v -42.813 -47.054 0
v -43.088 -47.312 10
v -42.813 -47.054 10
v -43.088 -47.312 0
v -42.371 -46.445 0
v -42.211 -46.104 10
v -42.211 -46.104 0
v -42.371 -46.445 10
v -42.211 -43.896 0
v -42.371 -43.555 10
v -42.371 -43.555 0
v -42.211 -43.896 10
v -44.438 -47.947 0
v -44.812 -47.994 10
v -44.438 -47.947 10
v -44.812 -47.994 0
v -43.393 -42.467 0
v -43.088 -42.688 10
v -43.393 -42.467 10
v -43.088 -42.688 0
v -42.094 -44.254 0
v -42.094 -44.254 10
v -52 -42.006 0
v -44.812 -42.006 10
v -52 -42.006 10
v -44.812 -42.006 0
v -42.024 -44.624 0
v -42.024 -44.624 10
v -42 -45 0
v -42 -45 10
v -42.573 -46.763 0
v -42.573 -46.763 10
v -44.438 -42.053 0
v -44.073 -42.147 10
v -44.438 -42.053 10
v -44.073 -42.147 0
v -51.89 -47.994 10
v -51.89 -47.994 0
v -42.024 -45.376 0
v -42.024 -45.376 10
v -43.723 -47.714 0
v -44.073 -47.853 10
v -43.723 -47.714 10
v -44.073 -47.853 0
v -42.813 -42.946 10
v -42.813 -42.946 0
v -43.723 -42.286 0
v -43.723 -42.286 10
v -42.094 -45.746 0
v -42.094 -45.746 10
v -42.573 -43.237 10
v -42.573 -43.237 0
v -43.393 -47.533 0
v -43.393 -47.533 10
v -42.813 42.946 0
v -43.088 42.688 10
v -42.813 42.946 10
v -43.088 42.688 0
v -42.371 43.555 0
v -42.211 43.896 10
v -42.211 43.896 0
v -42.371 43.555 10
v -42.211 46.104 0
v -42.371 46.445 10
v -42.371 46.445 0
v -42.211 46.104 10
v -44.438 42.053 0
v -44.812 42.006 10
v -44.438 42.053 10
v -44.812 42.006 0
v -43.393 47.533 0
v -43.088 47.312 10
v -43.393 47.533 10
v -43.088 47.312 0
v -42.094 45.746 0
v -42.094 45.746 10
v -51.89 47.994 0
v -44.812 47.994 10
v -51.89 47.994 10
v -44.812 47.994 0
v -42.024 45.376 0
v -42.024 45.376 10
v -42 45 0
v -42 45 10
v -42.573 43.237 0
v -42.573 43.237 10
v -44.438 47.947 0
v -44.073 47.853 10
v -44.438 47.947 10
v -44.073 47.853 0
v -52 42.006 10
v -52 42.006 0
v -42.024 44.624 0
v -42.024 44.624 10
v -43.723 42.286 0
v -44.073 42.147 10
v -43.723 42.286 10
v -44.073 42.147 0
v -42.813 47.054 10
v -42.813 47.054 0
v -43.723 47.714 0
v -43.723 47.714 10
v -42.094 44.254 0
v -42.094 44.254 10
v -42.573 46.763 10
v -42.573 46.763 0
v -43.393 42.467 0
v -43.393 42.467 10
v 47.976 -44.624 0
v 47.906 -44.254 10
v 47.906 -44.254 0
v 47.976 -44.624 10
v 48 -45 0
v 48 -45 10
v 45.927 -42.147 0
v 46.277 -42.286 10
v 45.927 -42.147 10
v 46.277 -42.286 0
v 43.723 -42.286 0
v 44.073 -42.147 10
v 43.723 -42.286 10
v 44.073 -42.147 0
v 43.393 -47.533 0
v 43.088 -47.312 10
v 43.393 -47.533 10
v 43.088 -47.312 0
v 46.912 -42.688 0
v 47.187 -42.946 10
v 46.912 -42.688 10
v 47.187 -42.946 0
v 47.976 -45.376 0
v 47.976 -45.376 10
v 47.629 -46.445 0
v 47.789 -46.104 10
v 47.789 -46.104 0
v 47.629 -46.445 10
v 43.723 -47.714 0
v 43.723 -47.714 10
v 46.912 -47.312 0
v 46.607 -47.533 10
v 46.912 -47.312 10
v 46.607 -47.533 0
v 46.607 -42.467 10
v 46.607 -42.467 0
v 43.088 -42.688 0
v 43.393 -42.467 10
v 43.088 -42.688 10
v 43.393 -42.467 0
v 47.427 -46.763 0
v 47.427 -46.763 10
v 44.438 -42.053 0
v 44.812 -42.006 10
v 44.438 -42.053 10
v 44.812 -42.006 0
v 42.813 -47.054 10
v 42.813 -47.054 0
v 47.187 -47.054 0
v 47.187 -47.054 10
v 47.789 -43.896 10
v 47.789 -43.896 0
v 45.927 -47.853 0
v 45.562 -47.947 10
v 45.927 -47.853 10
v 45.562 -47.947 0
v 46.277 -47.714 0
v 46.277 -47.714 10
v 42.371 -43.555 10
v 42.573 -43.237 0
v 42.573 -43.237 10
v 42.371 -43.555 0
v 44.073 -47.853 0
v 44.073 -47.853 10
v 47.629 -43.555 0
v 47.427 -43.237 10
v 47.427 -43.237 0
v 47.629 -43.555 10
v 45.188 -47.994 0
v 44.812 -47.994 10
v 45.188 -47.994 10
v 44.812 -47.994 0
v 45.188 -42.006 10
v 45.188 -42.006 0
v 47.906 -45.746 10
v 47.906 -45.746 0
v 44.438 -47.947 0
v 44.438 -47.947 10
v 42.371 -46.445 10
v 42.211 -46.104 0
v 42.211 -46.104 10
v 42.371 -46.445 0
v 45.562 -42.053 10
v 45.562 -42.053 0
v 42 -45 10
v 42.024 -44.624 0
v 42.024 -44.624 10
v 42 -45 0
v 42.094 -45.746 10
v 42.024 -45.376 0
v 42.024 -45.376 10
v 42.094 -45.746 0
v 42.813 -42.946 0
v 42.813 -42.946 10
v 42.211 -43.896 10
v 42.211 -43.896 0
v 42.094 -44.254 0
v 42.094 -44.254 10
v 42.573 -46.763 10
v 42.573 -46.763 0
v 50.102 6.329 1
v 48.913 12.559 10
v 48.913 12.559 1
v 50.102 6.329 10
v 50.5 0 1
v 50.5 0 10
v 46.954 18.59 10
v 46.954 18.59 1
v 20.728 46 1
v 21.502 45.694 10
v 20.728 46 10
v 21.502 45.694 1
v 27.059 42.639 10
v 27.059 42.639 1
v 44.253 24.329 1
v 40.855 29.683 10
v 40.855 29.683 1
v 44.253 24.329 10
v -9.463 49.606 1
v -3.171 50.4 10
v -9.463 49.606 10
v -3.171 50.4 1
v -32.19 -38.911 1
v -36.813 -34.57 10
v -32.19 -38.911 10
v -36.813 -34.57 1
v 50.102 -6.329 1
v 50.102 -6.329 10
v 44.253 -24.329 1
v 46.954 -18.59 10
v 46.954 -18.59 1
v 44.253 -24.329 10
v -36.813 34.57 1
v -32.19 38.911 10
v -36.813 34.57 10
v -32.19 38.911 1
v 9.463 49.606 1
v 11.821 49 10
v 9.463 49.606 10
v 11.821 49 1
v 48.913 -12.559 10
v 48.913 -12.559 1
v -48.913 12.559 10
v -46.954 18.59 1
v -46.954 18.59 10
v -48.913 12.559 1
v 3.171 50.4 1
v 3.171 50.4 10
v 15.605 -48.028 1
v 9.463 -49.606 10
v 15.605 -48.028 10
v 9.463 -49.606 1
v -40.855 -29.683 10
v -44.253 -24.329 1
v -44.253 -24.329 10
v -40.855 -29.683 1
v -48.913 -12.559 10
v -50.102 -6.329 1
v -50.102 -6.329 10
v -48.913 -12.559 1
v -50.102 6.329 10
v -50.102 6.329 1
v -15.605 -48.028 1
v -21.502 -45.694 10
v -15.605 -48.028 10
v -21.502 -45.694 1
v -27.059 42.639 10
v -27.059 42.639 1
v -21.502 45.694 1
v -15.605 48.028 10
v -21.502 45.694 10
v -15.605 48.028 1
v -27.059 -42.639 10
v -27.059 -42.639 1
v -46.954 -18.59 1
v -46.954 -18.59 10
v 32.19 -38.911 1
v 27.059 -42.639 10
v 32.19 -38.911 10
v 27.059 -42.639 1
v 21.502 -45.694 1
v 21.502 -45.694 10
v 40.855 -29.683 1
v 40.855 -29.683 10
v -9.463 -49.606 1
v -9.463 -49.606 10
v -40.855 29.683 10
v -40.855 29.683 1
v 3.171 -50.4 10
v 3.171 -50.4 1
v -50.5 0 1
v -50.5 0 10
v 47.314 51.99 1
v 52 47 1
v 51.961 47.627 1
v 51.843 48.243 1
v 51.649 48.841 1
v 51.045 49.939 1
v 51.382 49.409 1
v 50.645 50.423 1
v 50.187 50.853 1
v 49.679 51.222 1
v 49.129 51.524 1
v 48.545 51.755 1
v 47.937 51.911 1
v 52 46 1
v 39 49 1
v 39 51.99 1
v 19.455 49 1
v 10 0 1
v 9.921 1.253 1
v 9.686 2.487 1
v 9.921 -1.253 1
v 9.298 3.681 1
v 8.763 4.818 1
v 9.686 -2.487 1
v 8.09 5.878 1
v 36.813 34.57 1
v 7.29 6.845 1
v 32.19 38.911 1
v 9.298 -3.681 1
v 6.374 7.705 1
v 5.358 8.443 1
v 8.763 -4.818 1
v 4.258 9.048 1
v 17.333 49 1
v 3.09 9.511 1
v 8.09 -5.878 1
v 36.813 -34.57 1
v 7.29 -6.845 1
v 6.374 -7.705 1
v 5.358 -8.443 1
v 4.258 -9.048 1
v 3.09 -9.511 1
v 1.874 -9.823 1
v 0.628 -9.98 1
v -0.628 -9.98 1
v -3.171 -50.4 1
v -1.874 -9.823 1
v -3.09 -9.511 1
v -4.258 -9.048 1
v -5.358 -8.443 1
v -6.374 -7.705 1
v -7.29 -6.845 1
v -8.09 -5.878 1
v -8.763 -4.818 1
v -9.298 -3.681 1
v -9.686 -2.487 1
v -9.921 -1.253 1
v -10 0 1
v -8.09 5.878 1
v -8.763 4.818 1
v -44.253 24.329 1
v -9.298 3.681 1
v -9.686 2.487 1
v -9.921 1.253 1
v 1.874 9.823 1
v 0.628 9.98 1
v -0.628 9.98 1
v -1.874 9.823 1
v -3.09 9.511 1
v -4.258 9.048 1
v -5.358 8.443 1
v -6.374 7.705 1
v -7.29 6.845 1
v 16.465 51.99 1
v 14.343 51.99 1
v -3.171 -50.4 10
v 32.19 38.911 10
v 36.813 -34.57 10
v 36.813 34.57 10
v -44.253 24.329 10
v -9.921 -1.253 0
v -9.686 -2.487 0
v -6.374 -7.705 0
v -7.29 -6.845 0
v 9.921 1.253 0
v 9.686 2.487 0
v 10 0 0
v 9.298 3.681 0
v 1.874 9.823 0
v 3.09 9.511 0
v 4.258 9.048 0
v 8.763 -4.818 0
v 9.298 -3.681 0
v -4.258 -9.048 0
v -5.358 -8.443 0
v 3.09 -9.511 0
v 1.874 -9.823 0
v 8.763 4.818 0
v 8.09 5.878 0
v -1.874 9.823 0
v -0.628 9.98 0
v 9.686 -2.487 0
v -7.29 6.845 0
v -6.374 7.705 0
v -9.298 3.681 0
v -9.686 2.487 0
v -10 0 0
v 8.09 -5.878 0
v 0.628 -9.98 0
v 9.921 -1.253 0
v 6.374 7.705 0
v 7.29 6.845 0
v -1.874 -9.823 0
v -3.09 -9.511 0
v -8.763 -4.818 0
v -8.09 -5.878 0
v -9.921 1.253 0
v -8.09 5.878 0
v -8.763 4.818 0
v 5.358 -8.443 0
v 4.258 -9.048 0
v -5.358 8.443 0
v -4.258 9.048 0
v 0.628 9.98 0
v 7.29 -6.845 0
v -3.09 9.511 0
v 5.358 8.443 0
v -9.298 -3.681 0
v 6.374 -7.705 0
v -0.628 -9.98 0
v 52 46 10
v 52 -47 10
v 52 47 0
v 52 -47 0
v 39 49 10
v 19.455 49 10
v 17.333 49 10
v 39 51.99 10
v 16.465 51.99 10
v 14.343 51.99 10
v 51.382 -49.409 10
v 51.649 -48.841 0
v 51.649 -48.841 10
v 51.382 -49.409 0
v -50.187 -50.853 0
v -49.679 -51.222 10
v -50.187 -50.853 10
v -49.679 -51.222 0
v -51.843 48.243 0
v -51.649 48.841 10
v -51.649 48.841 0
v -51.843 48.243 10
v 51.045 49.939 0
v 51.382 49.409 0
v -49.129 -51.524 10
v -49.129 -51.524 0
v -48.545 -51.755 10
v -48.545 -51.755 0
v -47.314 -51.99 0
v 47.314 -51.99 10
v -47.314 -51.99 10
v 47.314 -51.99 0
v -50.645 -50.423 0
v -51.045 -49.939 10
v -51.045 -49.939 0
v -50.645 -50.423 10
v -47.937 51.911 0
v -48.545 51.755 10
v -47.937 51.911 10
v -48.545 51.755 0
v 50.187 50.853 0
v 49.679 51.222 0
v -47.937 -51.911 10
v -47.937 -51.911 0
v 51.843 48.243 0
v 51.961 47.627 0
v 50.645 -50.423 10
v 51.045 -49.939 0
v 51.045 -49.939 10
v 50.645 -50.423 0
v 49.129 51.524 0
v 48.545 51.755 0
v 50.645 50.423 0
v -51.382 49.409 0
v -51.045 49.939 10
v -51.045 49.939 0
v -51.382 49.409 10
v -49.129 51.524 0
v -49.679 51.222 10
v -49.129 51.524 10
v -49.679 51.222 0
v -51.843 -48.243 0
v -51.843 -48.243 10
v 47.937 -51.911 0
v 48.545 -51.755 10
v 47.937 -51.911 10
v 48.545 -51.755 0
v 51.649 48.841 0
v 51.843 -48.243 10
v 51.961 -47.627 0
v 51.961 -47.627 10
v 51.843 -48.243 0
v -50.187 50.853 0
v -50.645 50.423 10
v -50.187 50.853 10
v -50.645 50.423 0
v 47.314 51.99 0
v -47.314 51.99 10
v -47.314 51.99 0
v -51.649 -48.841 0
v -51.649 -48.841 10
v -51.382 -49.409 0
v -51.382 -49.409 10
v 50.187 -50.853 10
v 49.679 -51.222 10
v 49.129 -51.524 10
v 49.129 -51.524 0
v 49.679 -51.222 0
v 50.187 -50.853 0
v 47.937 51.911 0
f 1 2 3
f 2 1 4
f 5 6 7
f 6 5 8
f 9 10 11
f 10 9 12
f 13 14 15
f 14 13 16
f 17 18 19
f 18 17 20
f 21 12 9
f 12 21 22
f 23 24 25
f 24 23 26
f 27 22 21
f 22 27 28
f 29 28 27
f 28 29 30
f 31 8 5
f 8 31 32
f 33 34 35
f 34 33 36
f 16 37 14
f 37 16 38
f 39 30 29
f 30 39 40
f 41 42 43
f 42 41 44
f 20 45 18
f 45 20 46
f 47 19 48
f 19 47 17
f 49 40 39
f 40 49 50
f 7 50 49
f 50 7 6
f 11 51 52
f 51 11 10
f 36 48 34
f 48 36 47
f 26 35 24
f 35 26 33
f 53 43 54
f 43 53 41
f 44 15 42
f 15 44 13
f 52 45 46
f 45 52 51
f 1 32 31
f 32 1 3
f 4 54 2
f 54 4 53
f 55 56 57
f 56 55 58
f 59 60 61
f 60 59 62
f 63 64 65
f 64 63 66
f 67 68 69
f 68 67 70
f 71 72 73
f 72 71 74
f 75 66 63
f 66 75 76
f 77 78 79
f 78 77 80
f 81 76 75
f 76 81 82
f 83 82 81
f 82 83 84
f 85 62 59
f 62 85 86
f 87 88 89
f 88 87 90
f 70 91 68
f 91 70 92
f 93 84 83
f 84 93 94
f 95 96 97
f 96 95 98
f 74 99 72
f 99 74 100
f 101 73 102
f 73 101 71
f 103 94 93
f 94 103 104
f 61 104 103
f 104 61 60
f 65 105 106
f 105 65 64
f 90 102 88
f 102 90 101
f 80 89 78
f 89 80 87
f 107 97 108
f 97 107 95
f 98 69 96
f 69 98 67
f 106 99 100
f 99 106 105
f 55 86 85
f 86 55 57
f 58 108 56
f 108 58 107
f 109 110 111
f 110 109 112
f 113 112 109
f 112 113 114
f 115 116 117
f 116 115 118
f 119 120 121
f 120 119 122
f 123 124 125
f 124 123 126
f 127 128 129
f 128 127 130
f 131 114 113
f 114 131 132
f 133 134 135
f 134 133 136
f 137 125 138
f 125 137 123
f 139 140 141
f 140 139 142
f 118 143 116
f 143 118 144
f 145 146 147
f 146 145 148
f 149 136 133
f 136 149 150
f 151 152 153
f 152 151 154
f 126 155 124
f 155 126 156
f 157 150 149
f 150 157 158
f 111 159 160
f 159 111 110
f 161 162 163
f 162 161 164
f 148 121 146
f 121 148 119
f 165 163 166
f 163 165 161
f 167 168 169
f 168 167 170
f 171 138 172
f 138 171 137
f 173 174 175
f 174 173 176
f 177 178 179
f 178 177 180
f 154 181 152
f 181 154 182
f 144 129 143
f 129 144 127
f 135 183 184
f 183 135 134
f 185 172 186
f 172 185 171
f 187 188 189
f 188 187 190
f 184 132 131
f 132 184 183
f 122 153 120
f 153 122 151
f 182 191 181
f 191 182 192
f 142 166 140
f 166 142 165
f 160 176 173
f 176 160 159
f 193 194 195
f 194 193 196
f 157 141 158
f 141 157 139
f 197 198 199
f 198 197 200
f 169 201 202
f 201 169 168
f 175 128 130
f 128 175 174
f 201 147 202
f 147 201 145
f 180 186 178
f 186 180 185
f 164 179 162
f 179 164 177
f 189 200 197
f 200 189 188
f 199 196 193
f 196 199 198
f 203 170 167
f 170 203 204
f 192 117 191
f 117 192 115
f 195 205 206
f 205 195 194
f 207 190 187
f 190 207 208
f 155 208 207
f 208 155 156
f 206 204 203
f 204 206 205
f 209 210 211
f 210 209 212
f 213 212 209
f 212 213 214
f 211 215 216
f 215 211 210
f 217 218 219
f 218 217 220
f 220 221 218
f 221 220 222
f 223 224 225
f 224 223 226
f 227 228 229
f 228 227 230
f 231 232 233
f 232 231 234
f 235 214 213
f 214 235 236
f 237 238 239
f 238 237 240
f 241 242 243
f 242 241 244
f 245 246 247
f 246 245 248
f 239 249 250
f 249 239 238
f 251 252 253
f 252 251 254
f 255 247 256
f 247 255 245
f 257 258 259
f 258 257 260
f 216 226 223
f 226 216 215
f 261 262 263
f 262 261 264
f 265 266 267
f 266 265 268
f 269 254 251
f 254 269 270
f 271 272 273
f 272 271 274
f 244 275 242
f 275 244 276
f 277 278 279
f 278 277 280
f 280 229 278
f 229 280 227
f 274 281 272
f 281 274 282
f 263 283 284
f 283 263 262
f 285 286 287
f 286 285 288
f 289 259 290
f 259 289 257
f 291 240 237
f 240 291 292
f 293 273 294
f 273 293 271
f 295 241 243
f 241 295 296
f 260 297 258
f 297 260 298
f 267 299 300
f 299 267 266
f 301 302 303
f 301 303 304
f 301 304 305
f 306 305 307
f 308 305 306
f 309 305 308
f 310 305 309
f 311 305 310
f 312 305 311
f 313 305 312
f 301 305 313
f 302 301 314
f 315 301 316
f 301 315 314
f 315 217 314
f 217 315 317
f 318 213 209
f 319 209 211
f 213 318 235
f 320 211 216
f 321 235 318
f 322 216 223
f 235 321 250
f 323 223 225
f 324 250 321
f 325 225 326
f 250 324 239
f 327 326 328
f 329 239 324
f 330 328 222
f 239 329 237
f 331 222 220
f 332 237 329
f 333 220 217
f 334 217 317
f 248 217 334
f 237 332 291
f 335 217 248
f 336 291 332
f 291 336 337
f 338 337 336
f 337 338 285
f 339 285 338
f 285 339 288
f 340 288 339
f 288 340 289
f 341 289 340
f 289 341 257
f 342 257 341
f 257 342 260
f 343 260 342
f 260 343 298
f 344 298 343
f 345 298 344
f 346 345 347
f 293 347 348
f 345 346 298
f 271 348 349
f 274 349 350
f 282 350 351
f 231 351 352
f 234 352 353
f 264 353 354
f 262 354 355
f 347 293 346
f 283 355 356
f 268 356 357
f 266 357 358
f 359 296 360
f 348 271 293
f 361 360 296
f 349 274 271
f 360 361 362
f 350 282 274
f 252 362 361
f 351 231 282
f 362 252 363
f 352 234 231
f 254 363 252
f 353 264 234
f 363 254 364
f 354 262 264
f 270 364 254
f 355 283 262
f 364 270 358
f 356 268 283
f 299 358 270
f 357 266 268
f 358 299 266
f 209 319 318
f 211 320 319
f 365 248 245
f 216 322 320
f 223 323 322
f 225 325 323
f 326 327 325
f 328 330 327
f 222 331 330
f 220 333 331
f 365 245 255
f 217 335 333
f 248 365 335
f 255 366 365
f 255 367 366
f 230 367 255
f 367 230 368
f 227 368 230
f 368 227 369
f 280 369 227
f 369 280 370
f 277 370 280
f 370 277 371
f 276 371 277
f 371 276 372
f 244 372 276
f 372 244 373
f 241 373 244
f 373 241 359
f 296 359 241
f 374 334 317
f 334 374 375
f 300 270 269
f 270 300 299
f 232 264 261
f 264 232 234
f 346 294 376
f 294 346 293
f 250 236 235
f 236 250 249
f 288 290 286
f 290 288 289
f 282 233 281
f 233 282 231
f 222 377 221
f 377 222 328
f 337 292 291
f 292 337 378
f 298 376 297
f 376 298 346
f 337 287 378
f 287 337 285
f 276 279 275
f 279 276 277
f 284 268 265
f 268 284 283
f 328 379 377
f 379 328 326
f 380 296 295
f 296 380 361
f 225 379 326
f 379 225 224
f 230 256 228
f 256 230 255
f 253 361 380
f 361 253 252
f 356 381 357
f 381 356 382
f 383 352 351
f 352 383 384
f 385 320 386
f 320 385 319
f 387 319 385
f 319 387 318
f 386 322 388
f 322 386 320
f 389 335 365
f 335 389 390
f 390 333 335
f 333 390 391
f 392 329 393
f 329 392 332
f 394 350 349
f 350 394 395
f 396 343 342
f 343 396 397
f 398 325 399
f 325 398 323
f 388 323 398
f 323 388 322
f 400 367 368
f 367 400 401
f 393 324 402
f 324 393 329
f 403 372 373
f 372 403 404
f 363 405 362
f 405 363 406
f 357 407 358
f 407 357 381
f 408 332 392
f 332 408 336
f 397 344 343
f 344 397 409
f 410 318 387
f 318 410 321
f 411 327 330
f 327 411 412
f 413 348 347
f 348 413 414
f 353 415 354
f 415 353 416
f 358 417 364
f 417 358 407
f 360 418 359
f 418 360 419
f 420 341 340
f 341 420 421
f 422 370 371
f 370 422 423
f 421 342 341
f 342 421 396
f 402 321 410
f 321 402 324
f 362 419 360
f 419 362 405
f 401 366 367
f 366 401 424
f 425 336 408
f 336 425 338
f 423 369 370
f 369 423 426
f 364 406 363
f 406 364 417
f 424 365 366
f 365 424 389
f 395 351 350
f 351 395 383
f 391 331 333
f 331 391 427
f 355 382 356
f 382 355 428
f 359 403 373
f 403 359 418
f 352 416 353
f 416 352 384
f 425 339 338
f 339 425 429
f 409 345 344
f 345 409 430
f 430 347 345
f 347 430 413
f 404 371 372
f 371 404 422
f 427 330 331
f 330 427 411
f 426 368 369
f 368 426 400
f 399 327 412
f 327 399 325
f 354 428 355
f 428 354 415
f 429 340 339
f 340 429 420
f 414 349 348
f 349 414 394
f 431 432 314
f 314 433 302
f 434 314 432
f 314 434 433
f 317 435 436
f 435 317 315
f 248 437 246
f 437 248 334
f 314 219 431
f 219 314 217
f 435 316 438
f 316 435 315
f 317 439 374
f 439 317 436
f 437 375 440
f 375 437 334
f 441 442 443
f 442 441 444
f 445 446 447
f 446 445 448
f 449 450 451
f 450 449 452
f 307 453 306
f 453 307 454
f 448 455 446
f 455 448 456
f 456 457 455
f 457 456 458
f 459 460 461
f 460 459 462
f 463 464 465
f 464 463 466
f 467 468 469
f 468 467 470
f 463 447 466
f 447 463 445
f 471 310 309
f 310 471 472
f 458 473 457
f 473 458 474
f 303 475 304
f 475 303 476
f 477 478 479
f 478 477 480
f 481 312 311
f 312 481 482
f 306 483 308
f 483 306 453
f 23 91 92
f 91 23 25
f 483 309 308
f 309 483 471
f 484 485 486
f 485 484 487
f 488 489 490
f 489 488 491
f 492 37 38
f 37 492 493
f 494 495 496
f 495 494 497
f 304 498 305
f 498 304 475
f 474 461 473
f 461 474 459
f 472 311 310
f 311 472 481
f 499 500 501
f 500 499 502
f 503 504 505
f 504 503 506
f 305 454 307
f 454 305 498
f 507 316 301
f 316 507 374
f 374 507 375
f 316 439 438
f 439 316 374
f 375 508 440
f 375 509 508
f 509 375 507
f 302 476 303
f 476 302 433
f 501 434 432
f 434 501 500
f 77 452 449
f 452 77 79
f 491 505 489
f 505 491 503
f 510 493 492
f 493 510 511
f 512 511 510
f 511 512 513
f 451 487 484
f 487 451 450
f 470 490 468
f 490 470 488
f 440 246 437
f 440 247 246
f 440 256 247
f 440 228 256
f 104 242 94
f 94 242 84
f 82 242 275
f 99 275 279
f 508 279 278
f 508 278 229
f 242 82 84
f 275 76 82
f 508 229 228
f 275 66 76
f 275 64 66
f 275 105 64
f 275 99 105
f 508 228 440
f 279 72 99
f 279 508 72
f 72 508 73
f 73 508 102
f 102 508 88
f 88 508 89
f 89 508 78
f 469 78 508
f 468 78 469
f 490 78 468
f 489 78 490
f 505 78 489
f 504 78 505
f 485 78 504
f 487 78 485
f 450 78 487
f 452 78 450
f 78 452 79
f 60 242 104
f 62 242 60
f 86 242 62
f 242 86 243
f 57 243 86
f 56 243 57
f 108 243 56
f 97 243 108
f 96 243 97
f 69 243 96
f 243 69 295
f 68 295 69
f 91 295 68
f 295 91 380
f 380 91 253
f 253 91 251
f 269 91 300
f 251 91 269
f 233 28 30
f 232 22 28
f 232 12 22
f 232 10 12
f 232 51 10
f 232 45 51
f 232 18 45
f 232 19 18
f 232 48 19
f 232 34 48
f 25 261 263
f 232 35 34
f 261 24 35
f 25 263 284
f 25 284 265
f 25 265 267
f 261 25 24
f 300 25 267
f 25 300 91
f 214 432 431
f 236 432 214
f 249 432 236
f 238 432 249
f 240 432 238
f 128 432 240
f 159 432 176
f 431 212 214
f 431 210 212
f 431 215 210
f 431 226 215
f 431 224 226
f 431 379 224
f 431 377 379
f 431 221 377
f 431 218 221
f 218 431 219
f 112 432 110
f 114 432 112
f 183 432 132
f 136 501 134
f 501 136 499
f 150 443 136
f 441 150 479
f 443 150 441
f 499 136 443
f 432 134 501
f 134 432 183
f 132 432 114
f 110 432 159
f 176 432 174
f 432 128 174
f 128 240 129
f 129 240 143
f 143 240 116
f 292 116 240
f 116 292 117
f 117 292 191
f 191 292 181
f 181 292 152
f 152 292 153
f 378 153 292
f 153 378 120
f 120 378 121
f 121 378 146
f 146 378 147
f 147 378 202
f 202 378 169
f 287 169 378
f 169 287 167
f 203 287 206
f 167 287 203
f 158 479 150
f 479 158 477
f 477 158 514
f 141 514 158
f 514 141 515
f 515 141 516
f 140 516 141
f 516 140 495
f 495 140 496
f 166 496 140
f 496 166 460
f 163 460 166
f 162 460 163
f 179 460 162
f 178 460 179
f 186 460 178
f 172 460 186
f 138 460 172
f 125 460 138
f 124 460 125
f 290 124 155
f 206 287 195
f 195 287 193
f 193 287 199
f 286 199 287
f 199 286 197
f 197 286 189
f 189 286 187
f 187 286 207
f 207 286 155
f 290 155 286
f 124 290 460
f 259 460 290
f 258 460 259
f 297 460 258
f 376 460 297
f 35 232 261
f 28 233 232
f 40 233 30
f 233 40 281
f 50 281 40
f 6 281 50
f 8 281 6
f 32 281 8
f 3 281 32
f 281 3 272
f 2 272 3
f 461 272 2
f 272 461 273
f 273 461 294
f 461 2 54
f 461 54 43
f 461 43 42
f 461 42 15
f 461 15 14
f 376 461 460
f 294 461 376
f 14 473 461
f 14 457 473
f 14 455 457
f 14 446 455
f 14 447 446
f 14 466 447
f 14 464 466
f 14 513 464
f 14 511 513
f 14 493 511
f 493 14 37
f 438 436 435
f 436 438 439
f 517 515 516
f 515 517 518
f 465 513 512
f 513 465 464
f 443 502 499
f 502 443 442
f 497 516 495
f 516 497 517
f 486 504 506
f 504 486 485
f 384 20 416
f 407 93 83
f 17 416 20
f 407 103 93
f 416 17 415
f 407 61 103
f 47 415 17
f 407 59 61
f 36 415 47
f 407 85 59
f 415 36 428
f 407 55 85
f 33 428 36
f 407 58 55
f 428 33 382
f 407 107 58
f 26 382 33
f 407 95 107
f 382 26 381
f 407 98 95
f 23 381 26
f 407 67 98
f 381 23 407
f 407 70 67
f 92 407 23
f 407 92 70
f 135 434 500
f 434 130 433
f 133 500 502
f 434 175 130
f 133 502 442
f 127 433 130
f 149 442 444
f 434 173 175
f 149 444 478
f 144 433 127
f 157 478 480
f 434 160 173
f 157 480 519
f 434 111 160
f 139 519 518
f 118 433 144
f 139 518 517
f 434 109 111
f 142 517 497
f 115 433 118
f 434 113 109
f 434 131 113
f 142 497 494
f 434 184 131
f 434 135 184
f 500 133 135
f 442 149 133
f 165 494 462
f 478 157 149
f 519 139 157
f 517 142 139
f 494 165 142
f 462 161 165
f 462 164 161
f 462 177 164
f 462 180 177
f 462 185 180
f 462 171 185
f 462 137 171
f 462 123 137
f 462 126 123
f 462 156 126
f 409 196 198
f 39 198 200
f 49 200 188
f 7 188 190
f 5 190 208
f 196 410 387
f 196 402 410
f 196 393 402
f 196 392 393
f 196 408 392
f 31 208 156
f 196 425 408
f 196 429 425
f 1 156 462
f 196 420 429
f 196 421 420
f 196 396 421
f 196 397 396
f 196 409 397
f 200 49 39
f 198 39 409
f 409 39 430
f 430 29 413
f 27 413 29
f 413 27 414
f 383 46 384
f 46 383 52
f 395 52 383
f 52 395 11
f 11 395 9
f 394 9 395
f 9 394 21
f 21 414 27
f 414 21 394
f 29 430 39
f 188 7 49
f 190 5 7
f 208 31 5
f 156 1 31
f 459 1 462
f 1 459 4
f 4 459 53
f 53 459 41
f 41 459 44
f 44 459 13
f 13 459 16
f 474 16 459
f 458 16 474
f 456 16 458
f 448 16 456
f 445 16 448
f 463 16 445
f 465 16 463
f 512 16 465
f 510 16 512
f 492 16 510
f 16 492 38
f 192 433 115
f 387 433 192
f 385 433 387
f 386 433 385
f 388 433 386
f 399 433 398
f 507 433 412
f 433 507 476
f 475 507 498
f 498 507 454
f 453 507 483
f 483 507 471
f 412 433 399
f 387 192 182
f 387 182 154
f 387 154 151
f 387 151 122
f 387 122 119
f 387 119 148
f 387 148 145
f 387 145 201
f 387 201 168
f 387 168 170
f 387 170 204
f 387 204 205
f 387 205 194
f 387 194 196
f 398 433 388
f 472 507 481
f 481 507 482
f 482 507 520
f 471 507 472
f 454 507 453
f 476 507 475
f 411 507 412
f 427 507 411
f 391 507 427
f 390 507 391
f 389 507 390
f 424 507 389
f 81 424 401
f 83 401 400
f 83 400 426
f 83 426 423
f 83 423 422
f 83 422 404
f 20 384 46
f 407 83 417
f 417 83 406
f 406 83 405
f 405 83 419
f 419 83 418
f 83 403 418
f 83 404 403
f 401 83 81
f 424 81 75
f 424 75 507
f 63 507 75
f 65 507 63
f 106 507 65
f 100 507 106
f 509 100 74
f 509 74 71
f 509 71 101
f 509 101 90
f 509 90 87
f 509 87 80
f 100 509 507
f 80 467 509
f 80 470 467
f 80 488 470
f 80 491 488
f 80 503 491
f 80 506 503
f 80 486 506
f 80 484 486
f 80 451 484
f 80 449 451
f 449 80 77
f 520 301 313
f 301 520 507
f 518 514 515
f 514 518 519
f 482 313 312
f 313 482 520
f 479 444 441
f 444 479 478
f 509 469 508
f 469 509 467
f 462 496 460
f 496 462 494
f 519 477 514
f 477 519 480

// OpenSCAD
$fn = 50;


difference() {
	union() {
		translate(v = [0, 0, 0]) {
			rotate(a = [0, 0, 0]) {
				hull() {
					translate(v = [-47.0000000000, 47.0000000000, 0]) {
						rotate(a = [0, 0, 0]) {
							translate(v = [0, 0, 0]) {
								rotate(a = [0, 0, 0]) {
									cylinder(h = 10, r = 5);
								}
							}
						}
					}
					translate(v = [47.0000000000, 47.0000000000, 0]) {
						rotate(a = [0, 0, 0]) {
							translate(v = [0, 0, 0]) {
								rotate(a = [0, 0, 0]) {
									cylinder(h = 10, r = 5);
								}
							}
						}
					}
					translate(v = [-47.0000000000, -47.0000000000, 0]) {
						rotate(a = [0, 0, 0]) {
							translate(v = [0, 0, 0]) {
								rotate(a = [0, 0, 0]) {
									cylinder(h = 10, r = 5);
								}
							}
						}
					}
					translate(v = [47.0000000000, -47.0000000000, 0]) {
						rotate(a = [0, 0, 0]) {
							translate(v = [0, 0, 0]) {
								rotate(a = [0, 0, 0]) {
									cylinder(h = 10, r = 5);
								}
							}
						}
					}
				}
			}
		}
	}
	union() {
		translate(v = [-52.5000000000, -45.0000000000, -125]) {
			rotate(a = [0, 0, 0]) {
				hull() {
					translate(v = [7.5000000000, 0, 0]) {
						rotate(a = [0, 0, 0]) {
							translate(v = [0, 0, 0]) {
								rotate(a = [0, 0, 0]) {
									cylinder(h = 250, r = 3.0000000000);
								}
							}
						}
					}
					translate(v = [-7.5000000000, 0, 0]) {
						rotate(a = [0, 0, 0]) {
							translate(v = [0, 0, 0]) {
								rotate(a = [0, 0, 0]) {
									cylinder(h = 250, r = 3.0000000000);
								}
							}
						}
					}
				}
			}
		}
		translate(v = [-52.5000000000, 45.0000000000, -125]) {
			rotate(a = [0, 0, 0]) {
				hull() {
					translate(v = [7.5000000000, 0, 0]) {
						rotate(a = [0, 0, 0]) {
							translate(v = [0, 0, 0]) {
								rotate(a = [0, 0, 0]) {
									cylinder(h = 250, r = 3.0000000000);
								}
							}
						}
					}
					translate(v = [-7.5000000000, 0, 0]) {
						rotate(a = [0, 0, 0]) {
							translate(v = [0, 0, 0]) {
								rotate(a = [0, 0, 0]) {
									cylinder(h = 250, r = 3.0000000000);
								}
							}
						}
					}
				}
			}
		}
		translate(v = [45.0000000000, -45.0000000000, -125.0000000000]) {
			rotate(a = [0, 0, 0]) {
				cylinder(h = 250, r = 3.0000000000);
			}
		}
		translate(v = [0, 0, 1.0000000000]) {
			rotate(a = [0, 0, 0]) {
				cylinder(h = 12, r = 50.5000000000);
			}
		}
		translate(v = [0, 0, -5.0000000000]) {
			rotate(a = [0, 0, 0]) {
				cylinder(h = 10, r = 10.0000000000);
			}
		}
		translate(v = [0.0000000000, 46.0000000000, 1]) {
			rotate(a = [0, 0, 0]) {
				cube(size = [52.0000000000, 3, 12]);
			}
		}
		translate(v = [39.0000000000, 46.0000000000, 1]) {
			rotate(a = [0, 0, 0]) {
				cube(size = [13.0000000000, 6, 12]);
			}
		}
		translate(v = [13.5833333333, 52.7500000000, 1]) {
			rotate(a = [0, 0, -45]) {
				cube(size = [7.5000000000, 1.5000000000, 12]);
			}
		}
	}
}
